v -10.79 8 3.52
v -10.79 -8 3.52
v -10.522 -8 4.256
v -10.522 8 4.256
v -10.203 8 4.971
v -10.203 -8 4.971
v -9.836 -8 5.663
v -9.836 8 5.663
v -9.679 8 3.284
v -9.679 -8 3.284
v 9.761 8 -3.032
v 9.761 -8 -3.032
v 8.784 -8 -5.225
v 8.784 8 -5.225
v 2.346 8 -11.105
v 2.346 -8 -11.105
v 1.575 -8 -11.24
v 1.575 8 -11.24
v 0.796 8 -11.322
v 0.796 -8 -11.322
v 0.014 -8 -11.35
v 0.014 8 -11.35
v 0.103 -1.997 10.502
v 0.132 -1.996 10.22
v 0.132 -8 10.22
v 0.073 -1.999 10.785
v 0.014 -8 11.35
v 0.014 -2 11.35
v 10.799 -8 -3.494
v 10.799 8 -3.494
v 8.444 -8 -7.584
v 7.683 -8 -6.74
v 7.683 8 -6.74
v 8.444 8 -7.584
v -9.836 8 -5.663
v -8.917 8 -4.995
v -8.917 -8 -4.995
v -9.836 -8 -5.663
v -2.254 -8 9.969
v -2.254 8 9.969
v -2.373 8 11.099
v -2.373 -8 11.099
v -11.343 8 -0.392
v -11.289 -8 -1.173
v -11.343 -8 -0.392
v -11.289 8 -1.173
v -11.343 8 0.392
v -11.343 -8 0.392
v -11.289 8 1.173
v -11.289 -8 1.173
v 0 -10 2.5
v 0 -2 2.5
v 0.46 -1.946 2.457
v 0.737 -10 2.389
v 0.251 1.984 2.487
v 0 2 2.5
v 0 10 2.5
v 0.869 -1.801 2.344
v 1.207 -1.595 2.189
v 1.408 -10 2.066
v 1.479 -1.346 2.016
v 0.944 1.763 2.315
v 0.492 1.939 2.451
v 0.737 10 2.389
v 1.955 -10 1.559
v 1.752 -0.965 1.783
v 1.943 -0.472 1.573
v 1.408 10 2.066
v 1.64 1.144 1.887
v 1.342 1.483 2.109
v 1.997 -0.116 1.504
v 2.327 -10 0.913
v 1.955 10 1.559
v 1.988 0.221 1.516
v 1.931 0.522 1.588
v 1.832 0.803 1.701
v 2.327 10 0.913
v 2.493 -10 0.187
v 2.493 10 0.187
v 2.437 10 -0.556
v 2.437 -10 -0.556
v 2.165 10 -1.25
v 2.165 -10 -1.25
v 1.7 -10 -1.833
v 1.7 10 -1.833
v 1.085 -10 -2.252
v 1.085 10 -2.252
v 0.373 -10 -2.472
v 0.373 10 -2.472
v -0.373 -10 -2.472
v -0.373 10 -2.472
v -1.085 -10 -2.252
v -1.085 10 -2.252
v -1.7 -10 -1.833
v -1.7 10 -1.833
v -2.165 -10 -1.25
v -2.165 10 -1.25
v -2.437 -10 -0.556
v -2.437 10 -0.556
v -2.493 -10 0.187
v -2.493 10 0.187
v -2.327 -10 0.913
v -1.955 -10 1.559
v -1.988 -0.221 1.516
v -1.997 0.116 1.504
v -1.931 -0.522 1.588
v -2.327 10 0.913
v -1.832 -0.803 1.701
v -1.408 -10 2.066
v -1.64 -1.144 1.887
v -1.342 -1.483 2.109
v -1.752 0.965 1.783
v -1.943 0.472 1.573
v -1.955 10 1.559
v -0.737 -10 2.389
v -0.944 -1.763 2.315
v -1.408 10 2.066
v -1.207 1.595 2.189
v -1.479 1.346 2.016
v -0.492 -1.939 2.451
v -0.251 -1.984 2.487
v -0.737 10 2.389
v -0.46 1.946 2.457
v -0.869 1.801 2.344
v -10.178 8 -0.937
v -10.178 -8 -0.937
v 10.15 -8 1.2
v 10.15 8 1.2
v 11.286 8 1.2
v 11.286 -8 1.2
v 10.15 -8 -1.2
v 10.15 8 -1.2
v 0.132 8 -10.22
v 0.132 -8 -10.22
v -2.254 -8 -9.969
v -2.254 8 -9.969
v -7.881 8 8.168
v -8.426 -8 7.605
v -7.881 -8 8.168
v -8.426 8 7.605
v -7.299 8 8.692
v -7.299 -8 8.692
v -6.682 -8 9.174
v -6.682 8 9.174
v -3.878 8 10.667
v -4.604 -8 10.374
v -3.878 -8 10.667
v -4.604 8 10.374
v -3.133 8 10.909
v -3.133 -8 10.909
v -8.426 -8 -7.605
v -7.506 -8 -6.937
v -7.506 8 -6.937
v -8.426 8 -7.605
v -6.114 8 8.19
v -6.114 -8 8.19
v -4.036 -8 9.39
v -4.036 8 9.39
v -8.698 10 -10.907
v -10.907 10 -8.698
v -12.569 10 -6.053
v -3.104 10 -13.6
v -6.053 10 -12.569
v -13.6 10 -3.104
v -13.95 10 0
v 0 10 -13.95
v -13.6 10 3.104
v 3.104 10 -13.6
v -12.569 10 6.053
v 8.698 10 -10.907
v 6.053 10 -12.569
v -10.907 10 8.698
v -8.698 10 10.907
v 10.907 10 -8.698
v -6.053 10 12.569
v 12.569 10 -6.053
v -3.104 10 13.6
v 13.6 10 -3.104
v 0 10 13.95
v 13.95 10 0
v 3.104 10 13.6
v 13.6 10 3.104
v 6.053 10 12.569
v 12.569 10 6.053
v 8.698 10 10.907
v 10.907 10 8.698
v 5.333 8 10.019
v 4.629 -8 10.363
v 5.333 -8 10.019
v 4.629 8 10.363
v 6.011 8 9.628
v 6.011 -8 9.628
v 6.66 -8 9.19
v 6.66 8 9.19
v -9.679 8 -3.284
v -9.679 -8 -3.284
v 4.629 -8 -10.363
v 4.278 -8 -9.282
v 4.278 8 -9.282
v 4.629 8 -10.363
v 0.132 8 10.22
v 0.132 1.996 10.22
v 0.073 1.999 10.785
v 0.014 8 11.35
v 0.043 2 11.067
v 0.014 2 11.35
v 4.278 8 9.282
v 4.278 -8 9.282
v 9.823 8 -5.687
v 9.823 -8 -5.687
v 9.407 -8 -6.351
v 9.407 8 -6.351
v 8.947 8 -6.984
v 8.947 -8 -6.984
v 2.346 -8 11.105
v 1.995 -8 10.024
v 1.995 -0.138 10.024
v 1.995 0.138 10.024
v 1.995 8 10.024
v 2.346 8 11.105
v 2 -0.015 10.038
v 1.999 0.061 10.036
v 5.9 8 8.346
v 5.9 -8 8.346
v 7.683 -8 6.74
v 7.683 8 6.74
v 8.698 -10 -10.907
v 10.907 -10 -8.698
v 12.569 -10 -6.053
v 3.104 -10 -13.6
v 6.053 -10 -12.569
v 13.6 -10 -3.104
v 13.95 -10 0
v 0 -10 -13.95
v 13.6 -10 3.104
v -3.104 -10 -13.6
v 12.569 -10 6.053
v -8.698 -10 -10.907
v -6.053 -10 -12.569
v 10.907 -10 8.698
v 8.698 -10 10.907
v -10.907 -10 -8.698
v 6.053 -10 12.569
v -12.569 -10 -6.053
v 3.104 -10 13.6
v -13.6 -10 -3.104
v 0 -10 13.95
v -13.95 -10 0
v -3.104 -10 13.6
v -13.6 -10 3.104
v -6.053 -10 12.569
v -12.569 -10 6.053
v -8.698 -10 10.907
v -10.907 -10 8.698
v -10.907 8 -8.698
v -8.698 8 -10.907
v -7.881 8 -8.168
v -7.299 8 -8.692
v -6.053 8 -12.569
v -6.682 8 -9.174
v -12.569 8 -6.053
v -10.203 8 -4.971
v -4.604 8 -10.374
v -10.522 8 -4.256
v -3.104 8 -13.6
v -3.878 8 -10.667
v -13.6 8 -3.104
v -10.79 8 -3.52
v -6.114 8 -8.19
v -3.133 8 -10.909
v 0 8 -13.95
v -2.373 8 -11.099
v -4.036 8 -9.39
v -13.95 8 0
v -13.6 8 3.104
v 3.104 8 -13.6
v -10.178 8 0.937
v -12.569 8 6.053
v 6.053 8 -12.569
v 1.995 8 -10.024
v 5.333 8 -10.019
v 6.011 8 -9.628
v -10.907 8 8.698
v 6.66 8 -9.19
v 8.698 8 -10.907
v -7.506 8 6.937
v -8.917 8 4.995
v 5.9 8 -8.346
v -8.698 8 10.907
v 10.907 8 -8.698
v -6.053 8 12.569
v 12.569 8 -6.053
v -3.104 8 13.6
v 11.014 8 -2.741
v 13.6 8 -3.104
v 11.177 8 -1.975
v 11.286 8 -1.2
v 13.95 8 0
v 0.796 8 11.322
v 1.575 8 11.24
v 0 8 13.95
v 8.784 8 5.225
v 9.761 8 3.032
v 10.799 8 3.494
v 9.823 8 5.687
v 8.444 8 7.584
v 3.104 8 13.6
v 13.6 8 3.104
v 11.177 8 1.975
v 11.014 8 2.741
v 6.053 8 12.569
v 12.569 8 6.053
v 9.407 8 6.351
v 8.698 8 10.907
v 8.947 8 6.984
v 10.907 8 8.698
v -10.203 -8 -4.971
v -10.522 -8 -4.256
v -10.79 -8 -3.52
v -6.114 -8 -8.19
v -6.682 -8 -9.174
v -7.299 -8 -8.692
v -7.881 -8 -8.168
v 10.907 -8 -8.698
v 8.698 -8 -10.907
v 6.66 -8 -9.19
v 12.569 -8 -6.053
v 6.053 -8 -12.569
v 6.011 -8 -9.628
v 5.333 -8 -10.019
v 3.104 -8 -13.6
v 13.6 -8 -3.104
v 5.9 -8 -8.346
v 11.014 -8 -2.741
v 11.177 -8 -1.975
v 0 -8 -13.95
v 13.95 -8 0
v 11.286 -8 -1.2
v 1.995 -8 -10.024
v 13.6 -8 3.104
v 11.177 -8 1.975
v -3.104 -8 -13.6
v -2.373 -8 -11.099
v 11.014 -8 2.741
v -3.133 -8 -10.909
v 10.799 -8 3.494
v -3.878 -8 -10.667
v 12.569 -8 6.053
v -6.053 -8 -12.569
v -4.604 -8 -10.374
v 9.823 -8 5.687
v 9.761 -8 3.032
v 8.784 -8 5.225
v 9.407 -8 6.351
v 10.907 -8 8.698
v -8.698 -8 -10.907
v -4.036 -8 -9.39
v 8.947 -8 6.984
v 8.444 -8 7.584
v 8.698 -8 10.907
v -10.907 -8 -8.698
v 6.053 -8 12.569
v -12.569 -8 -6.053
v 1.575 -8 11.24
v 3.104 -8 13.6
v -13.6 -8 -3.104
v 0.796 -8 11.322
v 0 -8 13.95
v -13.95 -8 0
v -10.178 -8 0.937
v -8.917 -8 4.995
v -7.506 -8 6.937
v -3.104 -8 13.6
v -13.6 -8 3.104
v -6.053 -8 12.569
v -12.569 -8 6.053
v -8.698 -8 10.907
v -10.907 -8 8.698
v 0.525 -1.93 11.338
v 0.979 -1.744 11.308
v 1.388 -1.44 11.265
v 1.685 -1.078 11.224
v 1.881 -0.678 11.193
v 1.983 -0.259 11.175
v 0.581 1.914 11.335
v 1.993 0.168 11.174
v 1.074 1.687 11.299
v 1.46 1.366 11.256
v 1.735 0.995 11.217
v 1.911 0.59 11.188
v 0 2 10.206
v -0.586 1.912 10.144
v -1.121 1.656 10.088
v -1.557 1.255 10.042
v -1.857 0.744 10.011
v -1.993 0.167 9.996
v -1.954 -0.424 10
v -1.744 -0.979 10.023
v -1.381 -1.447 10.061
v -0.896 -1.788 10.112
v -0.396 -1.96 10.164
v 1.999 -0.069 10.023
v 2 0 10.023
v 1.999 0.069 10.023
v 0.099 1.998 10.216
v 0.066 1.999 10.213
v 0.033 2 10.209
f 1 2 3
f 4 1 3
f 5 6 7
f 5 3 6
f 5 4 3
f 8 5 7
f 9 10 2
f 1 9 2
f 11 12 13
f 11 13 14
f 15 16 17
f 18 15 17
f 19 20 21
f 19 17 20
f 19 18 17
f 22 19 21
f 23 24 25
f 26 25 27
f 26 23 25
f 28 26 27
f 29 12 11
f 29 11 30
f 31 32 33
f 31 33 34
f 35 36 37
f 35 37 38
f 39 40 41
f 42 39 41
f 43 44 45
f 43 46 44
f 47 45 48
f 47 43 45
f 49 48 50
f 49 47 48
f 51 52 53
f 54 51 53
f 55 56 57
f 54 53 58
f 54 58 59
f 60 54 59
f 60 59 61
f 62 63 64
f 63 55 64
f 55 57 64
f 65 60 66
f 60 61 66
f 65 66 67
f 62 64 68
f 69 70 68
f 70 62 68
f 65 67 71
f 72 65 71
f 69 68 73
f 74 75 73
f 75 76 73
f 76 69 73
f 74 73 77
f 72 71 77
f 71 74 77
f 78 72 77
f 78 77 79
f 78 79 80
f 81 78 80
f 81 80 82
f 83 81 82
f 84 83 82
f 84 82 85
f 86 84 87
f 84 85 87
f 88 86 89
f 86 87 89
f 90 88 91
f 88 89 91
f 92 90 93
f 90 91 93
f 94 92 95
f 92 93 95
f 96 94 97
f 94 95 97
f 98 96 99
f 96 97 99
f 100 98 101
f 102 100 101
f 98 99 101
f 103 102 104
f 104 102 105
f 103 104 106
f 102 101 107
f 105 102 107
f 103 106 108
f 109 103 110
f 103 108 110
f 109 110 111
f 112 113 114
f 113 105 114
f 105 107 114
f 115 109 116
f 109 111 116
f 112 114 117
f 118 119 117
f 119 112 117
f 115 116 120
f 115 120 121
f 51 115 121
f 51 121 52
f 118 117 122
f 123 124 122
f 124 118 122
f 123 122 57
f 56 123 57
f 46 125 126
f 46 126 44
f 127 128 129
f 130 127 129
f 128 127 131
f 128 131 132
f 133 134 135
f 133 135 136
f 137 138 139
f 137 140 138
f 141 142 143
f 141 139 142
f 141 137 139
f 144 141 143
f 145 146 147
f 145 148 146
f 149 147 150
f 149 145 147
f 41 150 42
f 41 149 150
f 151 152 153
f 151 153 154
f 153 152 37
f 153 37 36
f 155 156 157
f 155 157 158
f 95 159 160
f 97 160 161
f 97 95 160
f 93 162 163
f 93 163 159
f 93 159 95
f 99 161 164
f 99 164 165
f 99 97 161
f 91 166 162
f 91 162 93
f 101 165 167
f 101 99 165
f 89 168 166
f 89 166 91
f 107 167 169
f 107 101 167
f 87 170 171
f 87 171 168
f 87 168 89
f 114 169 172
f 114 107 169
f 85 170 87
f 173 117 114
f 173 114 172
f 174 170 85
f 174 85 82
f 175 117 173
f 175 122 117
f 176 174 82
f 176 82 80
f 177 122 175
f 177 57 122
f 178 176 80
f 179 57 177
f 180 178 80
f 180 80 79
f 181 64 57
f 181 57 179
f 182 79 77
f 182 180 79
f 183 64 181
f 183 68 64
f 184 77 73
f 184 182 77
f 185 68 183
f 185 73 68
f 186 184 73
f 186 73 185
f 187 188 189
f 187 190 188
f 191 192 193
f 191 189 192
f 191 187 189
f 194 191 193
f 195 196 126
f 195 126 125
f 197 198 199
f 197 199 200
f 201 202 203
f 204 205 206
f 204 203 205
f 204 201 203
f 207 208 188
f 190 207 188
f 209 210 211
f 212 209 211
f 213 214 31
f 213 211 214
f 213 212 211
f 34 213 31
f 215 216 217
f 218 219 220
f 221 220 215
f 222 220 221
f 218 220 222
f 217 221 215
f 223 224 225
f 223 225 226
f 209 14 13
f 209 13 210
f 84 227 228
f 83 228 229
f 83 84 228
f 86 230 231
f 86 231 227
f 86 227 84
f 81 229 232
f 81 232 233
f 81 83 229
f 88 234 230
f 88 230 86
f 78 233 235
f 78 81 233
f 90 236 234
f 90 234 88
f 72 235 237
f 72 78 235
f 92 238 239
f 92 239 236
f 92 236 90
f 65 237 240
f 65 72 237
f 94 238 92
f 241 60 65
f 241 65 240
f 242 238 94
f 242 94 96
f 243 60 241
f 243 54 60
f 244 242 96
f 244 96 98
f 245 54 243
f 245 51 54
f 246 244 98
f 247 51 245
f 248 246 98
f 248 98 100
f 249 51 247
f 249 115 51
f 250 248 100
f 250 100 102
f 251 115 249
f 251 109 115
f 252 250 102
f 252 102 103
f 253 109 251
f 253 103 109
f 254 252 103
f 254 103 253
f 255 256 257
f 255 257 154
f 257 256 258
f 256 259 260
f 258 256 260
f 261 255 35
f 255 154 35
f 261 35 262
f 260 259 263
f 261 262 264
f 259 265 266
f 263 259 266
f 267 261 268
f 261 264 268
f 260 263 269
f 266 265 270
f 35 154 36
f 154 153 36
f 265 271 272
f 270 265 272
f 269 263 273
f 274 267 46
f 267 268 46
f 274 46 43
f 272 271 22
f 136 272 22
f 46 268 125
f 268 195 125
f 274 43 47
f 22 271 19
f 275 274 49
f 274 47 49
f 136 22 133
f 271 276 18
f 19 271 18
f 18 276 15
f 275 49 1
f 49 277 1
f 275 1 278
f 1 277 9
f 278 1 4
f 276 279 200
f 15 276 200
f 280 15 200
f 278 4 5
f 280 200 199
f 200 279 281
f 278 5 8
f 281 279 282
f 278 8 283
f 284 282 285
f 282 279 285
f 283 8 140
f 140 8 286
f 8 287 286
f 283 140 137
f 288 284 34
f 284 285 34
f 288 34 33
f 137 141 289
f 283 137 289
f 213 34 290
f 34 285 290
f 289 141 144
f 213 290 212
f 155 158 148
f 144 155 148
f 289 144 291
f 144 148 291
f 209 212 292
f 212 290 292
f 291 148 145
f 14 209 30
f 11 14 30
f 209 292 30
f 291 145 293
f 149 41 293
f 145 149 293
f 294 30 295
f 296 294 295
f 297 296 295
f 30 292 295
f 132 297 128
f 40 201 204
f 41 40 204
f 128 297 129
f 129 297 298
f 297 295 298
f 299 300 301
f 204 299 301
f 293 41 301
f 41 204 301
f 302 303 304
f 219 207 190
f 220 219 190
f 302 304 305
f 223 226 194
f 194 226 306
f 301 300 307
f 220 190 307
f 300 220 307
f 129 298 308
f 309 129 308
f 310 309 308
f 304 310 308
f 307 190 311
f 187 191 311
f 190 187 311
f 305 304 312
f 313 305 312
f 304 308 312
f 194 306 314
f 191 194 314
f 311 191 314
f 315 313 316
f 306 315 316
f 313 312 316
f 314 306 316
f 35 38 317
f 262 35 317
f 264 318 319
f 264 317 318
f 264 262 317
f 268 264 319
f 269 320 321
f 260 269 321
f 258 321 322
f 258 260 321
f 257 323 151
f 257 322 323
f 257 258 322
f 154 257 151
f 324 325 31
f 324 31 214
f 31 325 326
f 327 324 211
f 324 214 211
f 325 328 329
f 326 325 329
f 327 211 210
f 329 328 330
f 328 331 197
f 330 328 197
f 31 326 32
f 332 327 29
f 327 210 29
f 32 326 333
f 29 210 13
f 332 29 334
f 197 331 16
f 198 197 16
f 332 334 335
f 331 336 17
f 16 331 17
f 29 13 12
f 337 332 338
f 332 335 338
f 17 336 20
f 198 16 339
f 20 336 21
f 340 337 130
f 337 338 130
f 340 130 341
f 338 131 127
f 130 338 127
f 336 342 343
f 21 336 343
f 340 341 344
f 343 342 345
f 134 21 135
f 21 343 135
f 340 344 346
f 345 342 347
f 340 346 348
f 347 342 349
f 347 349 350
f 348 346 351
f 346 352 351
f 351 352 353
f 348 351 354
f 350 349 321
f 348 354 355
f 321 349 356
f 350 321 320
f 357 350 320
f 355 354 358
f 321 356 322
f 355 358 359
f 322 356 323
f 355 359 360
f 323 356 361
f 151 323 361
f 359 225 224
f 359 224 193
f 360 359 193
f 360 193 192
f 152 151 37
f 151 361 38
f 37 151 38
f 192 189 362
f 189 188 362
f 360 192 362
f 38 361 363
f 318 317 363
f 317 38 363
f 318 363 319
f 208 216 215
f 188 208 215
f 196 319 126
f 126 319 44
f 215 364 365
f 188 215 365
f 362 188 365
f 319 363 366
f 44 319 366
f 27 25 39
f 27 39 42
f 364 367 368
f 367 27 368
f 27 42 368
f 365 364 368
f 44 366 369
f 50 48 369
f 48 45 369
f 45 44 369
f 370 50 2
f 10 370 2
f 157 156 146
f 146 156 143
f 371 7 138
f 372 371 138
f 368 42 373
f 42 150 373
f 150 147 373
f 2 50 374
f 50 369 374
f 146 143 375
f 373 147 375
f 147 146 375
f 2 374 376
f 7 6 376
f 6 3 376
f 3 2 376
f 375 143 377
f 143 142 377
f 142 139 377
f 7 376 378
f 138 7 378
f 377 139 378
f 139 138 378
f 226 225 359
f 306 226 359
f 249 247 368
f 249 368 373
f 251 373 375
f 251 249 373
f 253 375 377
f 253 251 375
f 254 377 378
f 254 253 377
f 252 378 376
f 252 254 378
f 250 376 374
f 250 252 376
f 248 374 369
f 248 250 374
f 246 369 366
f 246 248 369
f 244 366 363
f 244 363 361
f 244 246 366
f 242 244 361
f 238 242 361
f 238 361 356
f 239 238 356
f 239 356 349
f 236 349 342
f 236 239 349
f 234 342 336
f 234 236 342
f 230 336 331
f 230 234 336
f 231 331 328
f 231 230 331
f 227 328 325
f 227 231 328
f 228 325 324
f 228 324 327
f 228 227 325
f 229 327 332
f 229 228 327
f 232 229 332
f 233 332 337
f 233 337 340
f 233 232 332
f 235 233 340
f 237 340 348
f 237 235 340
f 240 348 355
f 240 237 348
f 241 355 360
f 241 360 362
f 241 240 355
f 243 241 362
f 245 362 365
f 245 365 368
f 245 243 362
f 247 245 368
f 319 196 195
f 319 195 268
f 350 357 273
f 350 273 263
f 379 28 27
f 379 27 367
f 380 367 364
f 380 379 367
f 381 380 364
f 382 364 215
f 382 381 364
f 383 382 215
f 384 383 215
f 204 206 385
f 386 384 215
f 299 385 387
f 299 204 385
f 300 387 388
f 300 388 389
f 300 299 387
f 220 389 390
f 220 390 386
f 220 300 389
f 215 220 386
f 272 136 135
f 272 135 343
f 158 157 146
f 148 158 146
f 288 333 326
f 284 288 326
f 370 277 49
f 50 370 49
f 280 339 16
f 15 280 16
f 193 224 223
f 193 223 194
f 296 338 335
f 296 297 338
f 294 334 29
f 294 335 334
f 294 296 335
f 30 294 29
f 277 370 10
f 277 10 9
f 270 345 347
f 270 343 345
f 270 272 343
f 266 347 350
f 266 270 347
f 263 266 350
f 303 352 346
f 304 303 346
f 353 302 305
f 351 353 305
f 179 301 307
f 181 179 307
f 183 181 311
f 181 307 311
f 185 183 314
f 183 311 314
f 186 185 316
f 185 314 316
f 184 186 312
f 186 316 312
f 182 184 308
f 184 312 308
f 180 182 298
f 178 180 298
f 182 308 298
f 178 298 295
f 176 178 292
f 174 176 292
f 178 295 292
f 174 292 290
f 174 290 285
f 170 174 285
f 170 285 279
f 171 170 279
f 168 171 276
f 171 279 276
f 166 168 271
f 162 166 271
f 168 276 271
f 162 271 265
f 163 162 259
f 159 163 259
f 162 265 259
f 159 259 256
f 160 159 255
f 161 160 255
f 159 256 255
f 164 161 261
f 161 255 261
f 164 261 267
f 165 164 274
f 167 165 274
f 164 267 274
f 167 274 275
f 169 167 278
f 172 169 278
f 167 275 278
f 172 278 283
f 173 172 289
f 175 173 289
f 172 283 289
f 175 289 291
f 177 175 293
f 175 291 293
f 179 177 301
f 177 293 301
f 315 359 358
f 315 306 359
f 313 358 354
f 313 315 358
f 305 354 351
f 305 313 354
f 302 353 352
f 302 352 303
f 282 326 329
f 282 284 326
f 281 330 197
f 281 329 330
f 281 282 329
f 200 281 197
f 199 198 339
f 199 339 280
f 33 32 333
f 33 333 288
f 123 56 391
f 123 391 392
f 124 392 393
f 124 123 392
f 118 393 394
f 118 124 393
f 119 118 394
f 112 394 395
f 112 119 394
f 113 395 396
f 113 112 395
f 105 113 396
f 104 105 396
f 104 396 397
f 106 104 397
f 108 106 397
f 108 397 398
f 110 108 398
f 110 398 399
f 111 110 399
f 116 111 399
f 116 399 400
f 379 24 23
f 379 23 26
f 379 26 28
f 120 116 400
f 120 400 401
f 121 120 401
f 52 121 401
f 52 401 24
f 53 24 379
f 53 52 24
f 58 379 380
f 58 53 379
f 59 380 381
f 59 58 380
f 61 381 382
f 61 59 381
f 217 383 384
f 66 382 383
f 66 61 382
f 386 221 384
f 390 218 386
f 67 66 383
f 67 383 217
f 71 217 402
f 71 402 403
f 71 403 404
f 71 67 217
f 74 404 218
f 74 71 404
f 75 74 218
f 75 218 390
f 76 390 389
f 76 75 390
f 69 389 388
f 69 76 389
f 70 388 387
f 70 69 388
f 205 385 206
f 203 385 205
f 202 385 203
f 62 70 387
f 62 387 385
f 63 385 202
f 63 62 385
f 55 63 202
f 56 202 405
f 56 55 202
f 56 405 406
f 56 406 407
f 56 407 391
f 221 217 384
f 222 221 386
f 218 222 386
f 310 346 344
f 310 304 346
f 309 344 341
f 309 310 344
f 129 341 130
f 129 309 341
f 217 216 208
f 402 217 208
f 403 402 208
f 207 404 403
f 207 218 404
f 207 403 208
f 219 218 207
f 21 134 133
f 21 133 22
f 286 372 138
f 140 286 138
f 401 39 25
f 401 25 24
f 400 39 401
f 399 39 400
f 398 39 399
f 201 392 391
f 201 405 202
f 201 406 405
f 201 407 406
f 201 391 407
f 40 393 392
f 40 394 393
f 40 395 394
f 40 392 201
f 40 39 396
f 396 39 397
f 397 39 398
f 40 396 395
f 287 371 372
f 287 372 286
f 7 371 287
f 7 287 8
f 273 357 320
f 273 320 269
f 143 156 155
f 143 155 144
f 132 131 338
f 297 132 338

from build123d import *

# Parameters (mm, degrees)
SKETCH_1_R               = 11.35
EXTRUDE_1_DEPTH          = 8
SKETCH_2_R               = 13.95
EXTRUDE_2_DEPTH          = 2
EXTRUDE_START            = 2
SKETCH_3_R               = 13.95
EXTRUDE_3_DEPTH          = 2
SKETCH_4_R               = 2.5
CUT_EXTRUDE_1_DEPTH      = 29.09279267
SKETCH_5_R               = 2
CUT_EXTRUDE_2_DEPTH      = 23.117979112
SKETCH_6_W               = 2.4
SKETCH_6_H               = 16
CUT_EXTRUDE_3_DEPTH      = 1.2
PATTERN_CIRCULAR_1_COUNT = 15


with BuildPart() as part:
    # 草图1 → 凸台-拉伸1 (new, symmetric)
    with BuildSketch(Plane(origin=(0, 0, 0), x_dir=(1, 0, 0), z_dir=(0, 1, 0))):
        with Locations(Location((0, 0, 0), (0, 0, 270))):
            Circle(SKETCH_1_R)
    extrude(amount=EXTRUDE_1_DEPTH, both=True)

    # 草图2 → 凸台-拉伸2 (add)
    with BuildSketch(Plane(origin=(0, 8, 0), x_dir=(1, 0, 0), z_dir=(0, 1, 0))):
        with Locations(Location((0, 0, 0), (0, 0, 270))):
            Circle(SKETCH_2_R)
    extrude(amount=EXTRUDE_2_DEPTH)

    # 草图3 → 凸台-拉伸3 (add)
    with BuildSketch(Plane.XZ.offset(8).offset(EXTRUDE_START)):
        with Locations(Location((0, 0, 0), (0, 0, 90))):
            Circle(SKETCH_3_R)
    extrude(amount=-EXTRUDE_3_DEPTH)

    # 草图4 → 切除-拉伸1 (cut, through all)
    with BuildSketch(Plane(origin=(0, 10, 0), x_dir=(1, 0, 0), z_dir=(0, 1, 0))):
        with Locations(Location((0, 0, 0), (0, 0, 270))):
            Circle(SKETCH_4_R)
    extrude(amount=-CUT_EXTRUDE_1_DEPTH, mode=Mode.SUBTRACT)

    # 草图5 → 切除-拉伸2 (cut, through all)
    with BuildSketch(Plane.XY):
        with Locations(Location((0, 0, 0), (0, 0, 90.000000031))):
            Circle(SKETCH_5_R)
    extrude(amount=CUT_EXTRUDE_2_DEPTH, mode=Mode.SUBTRACT)

    # 草图6 → 切除-拉伸3 (cut, symmetric)
    with BuildSketch(Plane.XY):
        with Locations((11.35, 0)):
            Rectangle(SKETCH_6_W, SKETCH_6_H)
    cut_extrude_3 = extrude(amount=CUT_EXTRUDE_3_DEPTH, both=True, mode=Mode.SUBTRACT)

    # 阵列(圆周)1: 切除-拉伸3 ×15 about axis
    pattern_circular_1_axis = Axis((0, 0, 0), (0, 1, 0))
    for i in range(1, PATTERN_CIRCULAR_1_COUNT):
        add(cut_extrude_3.rotate(pattern_circular_1_axis, i * 360 / PATTERN_CIRCULAR_1_COUNT), mode=Mode.SUBTRACT)


solid = part.part
